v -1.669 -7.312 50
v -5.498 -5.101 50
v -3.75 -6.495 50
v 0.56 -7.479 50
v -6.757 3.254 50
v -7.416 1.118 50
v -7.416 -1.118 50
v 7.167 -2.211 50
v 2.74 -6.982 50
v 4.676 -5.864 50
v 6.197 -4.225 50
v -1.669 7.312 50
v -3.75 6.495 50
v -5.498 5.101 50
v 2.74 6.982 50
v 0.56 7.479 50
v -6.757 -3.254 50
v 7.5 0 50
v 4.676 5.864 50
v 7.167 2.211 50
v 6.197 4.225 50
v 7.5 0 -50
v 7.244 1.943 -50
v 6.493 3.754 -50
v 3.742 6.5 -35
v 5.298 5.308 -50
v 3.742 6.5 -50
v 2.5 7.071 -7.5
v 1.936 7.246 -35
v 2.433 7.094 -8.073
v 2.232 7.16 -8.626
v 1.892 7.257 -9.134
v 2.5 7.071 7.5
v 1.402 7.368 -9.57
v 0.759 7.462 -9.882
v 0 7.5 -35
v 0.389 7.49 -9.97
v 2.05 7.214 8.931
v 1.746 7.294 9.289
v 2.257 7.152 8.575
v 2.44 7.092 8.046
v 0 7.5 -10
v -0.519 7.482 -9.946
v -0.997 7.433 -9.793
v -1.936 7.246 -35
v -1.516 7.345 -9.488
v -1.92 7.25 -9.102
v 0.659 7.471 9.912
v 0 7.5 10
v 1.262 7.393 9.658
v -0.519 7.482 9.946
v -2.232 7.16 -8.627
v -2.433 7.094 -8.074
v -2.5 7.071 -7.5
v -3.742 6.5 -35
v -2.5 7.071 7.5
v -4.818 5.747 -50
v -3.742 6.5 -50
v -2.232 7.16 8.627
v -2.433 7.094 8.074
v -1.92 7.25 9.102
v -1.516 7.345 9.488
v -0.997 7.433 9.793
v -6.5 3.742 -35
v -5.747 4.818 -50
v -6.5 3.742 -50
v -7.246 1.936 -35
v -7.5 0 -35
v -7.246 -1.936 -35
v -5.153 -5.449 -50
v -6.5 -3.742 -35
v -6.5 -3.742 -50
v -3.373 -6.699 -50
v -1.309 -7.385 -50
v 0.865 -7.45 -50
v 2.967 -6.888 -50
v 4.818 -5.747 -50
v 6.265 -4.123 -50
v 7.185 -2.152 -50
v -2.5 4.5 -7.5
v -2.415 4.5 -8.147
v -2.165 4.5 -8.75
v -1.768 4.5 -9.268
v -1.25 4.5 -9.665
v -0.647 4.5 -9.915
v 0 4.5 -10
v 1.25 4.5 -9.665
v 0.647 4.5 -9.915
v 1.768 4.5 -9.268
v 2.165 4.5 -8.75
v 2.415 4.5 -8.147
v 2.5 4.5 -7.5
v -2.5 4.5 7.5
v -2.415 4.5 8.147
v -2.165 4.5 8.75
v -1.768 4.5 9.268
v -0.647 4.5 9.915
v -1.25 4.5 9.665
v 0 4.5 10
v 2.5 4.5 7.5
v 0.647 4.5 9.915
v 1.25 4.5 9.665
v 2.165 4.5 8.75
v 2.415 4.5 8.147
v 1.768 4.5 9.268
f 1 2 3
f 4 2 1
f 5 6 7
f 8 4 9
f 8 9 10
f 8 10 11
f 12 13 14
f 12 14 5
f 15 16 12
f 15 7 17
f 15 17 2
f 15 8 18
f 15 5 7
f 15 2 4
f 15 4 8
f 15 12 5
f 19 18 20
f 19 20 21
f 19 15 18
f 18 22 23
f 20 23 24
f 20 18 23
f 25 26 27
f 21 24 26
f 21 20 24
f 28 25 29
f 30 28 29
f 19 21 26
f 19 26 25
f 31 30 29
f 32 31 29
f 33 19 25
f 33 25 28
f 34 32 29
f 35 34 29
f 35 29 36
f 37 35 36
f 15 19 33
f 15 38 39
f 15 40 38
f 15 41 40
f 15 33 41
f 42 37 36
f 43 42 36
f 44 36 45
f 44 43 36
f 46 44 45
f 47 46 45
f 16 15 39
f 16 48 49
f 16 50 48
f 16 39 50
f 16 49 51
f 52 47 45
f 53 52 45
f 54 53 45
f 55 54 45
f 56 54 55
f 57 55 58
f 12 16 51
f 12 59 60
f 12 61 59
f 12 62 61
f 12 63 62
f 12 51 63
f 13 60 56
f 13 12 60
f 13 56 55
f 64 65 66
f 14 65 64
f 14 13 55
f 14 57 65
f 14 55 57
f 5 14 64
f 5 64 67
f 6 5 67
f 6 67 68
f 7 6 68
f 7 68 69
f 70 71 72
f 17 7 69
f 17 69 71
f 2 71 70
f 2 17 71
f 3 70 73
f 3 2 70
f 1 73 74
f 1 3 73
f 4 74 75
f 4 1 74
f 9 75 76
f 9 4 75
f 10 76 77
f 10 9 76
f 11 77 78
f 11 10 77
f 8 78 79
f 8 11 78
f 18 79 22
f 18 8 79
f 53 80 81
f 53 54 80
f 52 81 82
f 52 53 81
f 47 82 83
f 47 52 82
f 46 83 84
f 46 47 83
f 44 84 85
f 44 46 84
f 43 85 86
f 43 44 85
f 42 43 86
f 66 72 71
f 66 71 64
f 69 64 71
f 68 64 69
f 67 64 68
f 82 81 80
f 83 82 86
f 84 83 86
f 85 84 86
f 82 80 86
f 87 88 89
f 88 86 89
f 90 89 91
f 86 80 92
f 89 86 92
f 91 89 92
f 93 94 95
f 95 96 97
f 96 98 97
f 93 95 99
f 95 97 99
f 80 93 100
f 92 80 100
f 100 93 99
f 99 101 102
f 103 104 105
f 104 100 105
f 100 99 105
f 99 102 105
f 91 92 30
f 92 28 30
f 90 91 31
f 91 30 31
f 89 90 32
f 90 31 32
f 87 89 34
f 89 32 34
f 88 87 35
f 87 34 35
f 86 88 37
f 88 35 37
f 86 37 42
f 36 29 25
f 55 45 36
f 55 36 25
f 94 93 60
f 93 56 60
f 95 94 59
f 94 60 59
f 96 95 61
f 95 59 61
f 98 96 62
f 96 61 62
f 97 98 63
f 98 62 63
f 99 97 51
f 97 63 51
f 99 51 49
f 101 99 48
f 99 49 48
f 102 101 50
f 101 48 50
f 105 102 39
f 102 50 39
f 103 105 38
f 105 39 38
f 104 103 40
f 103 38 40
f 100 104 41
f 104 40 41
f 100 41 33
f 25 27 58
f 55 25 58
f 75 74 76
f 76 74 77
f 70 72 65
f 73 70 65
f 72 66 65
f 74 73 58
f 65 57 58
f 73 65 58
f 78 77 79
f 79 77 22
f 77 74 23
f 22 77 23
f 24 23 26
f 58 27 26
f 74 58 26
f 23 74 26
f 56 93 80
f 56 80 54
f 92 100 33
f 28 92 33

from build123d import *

# Parameters (mm, degrees)
SKETCH1_R           = 7.5
BOSS_EXTRUDE1_DEPTH = 50
SKETCH2_W           = 5
SKETCH2_H           = 5
CUT_EXTRUDE1_DEPTH  = 10
FILLET1_R           = 2.5
FILLET2_R           = 2.5
CUT_EXTRUDE2_START  = -15
CUT_EXTRUDE2_DEPTH  = 15


with BuildPart() as part:
    # Sketch1 → Boss-Extrude1 (new, symmetric)
    with BuildSketch(Plane.XY):
        Circle(SKETCH1_R)
    extrude(amount=BOSS_EXTRUDE1_DEPTH, both=True)

    # Sketch2 → Cut-Extrude1 (cut, symmetric)
    with BuildSketch(Plane.XY):
        with Locations((0, 7)):
            Rectangle(SKETCH2_W, SKETCH2_H)
    extrude(amount=CUT_EXTRUDE1_DEPTH, both=True, mode=Mode.SUBTRACT)

    # Fillet1
    fillet1_edges = [part.edges().sort_by_distance(p)[0] for p in [
        (-2.5, 5.785533906, -10),
        (2.5, 5.785533906, -10),
    ]]
    fillet(fillet1_edges, radius=FILLET1_R - 0.0001)  # a hair under: the kernel refuses the full size

    # Fillet2
    fillet2_edges = [part.edges().sort_by_distance(p)[0] for p in [
        (-2.5, 5.785533906, 10),
        (2.5, 5.785533906, 10),
    ]]
    fillet(fillet2_edges, radius=FILLET2_R - 0.0001)  # a hair under: the kernel refuses the full size

    # Sketch3 → Cut-Extrude2 (cut)
    with BuildSketch(Plane(origin=(0, 0, -50), x_dir=(-1, 0, 0), z_dir=(0, 0, -1)).offset(CUT_EXTRUDE2_START)):
        with BuildLine():
            Line((-3.741657387, 6.5), (3.741657387, 6.5))
            ThreePointArc((3.741657387, 6.5), (0, 7.5), (-3.741657387, 6.5))
        make_face()
        with BuildLine():
            Line((6.5, -3.741657387), (6.5, 3.741657387))
            ThreePointArc((6.5, 3.741657387), (7.5, 0), (6.5, -3.741657387))
        make_face()
    extrude(amount=CUT_EXTRUDE2_DEPTH, mode=Mode.SUBTRACT)


solid = part.part
